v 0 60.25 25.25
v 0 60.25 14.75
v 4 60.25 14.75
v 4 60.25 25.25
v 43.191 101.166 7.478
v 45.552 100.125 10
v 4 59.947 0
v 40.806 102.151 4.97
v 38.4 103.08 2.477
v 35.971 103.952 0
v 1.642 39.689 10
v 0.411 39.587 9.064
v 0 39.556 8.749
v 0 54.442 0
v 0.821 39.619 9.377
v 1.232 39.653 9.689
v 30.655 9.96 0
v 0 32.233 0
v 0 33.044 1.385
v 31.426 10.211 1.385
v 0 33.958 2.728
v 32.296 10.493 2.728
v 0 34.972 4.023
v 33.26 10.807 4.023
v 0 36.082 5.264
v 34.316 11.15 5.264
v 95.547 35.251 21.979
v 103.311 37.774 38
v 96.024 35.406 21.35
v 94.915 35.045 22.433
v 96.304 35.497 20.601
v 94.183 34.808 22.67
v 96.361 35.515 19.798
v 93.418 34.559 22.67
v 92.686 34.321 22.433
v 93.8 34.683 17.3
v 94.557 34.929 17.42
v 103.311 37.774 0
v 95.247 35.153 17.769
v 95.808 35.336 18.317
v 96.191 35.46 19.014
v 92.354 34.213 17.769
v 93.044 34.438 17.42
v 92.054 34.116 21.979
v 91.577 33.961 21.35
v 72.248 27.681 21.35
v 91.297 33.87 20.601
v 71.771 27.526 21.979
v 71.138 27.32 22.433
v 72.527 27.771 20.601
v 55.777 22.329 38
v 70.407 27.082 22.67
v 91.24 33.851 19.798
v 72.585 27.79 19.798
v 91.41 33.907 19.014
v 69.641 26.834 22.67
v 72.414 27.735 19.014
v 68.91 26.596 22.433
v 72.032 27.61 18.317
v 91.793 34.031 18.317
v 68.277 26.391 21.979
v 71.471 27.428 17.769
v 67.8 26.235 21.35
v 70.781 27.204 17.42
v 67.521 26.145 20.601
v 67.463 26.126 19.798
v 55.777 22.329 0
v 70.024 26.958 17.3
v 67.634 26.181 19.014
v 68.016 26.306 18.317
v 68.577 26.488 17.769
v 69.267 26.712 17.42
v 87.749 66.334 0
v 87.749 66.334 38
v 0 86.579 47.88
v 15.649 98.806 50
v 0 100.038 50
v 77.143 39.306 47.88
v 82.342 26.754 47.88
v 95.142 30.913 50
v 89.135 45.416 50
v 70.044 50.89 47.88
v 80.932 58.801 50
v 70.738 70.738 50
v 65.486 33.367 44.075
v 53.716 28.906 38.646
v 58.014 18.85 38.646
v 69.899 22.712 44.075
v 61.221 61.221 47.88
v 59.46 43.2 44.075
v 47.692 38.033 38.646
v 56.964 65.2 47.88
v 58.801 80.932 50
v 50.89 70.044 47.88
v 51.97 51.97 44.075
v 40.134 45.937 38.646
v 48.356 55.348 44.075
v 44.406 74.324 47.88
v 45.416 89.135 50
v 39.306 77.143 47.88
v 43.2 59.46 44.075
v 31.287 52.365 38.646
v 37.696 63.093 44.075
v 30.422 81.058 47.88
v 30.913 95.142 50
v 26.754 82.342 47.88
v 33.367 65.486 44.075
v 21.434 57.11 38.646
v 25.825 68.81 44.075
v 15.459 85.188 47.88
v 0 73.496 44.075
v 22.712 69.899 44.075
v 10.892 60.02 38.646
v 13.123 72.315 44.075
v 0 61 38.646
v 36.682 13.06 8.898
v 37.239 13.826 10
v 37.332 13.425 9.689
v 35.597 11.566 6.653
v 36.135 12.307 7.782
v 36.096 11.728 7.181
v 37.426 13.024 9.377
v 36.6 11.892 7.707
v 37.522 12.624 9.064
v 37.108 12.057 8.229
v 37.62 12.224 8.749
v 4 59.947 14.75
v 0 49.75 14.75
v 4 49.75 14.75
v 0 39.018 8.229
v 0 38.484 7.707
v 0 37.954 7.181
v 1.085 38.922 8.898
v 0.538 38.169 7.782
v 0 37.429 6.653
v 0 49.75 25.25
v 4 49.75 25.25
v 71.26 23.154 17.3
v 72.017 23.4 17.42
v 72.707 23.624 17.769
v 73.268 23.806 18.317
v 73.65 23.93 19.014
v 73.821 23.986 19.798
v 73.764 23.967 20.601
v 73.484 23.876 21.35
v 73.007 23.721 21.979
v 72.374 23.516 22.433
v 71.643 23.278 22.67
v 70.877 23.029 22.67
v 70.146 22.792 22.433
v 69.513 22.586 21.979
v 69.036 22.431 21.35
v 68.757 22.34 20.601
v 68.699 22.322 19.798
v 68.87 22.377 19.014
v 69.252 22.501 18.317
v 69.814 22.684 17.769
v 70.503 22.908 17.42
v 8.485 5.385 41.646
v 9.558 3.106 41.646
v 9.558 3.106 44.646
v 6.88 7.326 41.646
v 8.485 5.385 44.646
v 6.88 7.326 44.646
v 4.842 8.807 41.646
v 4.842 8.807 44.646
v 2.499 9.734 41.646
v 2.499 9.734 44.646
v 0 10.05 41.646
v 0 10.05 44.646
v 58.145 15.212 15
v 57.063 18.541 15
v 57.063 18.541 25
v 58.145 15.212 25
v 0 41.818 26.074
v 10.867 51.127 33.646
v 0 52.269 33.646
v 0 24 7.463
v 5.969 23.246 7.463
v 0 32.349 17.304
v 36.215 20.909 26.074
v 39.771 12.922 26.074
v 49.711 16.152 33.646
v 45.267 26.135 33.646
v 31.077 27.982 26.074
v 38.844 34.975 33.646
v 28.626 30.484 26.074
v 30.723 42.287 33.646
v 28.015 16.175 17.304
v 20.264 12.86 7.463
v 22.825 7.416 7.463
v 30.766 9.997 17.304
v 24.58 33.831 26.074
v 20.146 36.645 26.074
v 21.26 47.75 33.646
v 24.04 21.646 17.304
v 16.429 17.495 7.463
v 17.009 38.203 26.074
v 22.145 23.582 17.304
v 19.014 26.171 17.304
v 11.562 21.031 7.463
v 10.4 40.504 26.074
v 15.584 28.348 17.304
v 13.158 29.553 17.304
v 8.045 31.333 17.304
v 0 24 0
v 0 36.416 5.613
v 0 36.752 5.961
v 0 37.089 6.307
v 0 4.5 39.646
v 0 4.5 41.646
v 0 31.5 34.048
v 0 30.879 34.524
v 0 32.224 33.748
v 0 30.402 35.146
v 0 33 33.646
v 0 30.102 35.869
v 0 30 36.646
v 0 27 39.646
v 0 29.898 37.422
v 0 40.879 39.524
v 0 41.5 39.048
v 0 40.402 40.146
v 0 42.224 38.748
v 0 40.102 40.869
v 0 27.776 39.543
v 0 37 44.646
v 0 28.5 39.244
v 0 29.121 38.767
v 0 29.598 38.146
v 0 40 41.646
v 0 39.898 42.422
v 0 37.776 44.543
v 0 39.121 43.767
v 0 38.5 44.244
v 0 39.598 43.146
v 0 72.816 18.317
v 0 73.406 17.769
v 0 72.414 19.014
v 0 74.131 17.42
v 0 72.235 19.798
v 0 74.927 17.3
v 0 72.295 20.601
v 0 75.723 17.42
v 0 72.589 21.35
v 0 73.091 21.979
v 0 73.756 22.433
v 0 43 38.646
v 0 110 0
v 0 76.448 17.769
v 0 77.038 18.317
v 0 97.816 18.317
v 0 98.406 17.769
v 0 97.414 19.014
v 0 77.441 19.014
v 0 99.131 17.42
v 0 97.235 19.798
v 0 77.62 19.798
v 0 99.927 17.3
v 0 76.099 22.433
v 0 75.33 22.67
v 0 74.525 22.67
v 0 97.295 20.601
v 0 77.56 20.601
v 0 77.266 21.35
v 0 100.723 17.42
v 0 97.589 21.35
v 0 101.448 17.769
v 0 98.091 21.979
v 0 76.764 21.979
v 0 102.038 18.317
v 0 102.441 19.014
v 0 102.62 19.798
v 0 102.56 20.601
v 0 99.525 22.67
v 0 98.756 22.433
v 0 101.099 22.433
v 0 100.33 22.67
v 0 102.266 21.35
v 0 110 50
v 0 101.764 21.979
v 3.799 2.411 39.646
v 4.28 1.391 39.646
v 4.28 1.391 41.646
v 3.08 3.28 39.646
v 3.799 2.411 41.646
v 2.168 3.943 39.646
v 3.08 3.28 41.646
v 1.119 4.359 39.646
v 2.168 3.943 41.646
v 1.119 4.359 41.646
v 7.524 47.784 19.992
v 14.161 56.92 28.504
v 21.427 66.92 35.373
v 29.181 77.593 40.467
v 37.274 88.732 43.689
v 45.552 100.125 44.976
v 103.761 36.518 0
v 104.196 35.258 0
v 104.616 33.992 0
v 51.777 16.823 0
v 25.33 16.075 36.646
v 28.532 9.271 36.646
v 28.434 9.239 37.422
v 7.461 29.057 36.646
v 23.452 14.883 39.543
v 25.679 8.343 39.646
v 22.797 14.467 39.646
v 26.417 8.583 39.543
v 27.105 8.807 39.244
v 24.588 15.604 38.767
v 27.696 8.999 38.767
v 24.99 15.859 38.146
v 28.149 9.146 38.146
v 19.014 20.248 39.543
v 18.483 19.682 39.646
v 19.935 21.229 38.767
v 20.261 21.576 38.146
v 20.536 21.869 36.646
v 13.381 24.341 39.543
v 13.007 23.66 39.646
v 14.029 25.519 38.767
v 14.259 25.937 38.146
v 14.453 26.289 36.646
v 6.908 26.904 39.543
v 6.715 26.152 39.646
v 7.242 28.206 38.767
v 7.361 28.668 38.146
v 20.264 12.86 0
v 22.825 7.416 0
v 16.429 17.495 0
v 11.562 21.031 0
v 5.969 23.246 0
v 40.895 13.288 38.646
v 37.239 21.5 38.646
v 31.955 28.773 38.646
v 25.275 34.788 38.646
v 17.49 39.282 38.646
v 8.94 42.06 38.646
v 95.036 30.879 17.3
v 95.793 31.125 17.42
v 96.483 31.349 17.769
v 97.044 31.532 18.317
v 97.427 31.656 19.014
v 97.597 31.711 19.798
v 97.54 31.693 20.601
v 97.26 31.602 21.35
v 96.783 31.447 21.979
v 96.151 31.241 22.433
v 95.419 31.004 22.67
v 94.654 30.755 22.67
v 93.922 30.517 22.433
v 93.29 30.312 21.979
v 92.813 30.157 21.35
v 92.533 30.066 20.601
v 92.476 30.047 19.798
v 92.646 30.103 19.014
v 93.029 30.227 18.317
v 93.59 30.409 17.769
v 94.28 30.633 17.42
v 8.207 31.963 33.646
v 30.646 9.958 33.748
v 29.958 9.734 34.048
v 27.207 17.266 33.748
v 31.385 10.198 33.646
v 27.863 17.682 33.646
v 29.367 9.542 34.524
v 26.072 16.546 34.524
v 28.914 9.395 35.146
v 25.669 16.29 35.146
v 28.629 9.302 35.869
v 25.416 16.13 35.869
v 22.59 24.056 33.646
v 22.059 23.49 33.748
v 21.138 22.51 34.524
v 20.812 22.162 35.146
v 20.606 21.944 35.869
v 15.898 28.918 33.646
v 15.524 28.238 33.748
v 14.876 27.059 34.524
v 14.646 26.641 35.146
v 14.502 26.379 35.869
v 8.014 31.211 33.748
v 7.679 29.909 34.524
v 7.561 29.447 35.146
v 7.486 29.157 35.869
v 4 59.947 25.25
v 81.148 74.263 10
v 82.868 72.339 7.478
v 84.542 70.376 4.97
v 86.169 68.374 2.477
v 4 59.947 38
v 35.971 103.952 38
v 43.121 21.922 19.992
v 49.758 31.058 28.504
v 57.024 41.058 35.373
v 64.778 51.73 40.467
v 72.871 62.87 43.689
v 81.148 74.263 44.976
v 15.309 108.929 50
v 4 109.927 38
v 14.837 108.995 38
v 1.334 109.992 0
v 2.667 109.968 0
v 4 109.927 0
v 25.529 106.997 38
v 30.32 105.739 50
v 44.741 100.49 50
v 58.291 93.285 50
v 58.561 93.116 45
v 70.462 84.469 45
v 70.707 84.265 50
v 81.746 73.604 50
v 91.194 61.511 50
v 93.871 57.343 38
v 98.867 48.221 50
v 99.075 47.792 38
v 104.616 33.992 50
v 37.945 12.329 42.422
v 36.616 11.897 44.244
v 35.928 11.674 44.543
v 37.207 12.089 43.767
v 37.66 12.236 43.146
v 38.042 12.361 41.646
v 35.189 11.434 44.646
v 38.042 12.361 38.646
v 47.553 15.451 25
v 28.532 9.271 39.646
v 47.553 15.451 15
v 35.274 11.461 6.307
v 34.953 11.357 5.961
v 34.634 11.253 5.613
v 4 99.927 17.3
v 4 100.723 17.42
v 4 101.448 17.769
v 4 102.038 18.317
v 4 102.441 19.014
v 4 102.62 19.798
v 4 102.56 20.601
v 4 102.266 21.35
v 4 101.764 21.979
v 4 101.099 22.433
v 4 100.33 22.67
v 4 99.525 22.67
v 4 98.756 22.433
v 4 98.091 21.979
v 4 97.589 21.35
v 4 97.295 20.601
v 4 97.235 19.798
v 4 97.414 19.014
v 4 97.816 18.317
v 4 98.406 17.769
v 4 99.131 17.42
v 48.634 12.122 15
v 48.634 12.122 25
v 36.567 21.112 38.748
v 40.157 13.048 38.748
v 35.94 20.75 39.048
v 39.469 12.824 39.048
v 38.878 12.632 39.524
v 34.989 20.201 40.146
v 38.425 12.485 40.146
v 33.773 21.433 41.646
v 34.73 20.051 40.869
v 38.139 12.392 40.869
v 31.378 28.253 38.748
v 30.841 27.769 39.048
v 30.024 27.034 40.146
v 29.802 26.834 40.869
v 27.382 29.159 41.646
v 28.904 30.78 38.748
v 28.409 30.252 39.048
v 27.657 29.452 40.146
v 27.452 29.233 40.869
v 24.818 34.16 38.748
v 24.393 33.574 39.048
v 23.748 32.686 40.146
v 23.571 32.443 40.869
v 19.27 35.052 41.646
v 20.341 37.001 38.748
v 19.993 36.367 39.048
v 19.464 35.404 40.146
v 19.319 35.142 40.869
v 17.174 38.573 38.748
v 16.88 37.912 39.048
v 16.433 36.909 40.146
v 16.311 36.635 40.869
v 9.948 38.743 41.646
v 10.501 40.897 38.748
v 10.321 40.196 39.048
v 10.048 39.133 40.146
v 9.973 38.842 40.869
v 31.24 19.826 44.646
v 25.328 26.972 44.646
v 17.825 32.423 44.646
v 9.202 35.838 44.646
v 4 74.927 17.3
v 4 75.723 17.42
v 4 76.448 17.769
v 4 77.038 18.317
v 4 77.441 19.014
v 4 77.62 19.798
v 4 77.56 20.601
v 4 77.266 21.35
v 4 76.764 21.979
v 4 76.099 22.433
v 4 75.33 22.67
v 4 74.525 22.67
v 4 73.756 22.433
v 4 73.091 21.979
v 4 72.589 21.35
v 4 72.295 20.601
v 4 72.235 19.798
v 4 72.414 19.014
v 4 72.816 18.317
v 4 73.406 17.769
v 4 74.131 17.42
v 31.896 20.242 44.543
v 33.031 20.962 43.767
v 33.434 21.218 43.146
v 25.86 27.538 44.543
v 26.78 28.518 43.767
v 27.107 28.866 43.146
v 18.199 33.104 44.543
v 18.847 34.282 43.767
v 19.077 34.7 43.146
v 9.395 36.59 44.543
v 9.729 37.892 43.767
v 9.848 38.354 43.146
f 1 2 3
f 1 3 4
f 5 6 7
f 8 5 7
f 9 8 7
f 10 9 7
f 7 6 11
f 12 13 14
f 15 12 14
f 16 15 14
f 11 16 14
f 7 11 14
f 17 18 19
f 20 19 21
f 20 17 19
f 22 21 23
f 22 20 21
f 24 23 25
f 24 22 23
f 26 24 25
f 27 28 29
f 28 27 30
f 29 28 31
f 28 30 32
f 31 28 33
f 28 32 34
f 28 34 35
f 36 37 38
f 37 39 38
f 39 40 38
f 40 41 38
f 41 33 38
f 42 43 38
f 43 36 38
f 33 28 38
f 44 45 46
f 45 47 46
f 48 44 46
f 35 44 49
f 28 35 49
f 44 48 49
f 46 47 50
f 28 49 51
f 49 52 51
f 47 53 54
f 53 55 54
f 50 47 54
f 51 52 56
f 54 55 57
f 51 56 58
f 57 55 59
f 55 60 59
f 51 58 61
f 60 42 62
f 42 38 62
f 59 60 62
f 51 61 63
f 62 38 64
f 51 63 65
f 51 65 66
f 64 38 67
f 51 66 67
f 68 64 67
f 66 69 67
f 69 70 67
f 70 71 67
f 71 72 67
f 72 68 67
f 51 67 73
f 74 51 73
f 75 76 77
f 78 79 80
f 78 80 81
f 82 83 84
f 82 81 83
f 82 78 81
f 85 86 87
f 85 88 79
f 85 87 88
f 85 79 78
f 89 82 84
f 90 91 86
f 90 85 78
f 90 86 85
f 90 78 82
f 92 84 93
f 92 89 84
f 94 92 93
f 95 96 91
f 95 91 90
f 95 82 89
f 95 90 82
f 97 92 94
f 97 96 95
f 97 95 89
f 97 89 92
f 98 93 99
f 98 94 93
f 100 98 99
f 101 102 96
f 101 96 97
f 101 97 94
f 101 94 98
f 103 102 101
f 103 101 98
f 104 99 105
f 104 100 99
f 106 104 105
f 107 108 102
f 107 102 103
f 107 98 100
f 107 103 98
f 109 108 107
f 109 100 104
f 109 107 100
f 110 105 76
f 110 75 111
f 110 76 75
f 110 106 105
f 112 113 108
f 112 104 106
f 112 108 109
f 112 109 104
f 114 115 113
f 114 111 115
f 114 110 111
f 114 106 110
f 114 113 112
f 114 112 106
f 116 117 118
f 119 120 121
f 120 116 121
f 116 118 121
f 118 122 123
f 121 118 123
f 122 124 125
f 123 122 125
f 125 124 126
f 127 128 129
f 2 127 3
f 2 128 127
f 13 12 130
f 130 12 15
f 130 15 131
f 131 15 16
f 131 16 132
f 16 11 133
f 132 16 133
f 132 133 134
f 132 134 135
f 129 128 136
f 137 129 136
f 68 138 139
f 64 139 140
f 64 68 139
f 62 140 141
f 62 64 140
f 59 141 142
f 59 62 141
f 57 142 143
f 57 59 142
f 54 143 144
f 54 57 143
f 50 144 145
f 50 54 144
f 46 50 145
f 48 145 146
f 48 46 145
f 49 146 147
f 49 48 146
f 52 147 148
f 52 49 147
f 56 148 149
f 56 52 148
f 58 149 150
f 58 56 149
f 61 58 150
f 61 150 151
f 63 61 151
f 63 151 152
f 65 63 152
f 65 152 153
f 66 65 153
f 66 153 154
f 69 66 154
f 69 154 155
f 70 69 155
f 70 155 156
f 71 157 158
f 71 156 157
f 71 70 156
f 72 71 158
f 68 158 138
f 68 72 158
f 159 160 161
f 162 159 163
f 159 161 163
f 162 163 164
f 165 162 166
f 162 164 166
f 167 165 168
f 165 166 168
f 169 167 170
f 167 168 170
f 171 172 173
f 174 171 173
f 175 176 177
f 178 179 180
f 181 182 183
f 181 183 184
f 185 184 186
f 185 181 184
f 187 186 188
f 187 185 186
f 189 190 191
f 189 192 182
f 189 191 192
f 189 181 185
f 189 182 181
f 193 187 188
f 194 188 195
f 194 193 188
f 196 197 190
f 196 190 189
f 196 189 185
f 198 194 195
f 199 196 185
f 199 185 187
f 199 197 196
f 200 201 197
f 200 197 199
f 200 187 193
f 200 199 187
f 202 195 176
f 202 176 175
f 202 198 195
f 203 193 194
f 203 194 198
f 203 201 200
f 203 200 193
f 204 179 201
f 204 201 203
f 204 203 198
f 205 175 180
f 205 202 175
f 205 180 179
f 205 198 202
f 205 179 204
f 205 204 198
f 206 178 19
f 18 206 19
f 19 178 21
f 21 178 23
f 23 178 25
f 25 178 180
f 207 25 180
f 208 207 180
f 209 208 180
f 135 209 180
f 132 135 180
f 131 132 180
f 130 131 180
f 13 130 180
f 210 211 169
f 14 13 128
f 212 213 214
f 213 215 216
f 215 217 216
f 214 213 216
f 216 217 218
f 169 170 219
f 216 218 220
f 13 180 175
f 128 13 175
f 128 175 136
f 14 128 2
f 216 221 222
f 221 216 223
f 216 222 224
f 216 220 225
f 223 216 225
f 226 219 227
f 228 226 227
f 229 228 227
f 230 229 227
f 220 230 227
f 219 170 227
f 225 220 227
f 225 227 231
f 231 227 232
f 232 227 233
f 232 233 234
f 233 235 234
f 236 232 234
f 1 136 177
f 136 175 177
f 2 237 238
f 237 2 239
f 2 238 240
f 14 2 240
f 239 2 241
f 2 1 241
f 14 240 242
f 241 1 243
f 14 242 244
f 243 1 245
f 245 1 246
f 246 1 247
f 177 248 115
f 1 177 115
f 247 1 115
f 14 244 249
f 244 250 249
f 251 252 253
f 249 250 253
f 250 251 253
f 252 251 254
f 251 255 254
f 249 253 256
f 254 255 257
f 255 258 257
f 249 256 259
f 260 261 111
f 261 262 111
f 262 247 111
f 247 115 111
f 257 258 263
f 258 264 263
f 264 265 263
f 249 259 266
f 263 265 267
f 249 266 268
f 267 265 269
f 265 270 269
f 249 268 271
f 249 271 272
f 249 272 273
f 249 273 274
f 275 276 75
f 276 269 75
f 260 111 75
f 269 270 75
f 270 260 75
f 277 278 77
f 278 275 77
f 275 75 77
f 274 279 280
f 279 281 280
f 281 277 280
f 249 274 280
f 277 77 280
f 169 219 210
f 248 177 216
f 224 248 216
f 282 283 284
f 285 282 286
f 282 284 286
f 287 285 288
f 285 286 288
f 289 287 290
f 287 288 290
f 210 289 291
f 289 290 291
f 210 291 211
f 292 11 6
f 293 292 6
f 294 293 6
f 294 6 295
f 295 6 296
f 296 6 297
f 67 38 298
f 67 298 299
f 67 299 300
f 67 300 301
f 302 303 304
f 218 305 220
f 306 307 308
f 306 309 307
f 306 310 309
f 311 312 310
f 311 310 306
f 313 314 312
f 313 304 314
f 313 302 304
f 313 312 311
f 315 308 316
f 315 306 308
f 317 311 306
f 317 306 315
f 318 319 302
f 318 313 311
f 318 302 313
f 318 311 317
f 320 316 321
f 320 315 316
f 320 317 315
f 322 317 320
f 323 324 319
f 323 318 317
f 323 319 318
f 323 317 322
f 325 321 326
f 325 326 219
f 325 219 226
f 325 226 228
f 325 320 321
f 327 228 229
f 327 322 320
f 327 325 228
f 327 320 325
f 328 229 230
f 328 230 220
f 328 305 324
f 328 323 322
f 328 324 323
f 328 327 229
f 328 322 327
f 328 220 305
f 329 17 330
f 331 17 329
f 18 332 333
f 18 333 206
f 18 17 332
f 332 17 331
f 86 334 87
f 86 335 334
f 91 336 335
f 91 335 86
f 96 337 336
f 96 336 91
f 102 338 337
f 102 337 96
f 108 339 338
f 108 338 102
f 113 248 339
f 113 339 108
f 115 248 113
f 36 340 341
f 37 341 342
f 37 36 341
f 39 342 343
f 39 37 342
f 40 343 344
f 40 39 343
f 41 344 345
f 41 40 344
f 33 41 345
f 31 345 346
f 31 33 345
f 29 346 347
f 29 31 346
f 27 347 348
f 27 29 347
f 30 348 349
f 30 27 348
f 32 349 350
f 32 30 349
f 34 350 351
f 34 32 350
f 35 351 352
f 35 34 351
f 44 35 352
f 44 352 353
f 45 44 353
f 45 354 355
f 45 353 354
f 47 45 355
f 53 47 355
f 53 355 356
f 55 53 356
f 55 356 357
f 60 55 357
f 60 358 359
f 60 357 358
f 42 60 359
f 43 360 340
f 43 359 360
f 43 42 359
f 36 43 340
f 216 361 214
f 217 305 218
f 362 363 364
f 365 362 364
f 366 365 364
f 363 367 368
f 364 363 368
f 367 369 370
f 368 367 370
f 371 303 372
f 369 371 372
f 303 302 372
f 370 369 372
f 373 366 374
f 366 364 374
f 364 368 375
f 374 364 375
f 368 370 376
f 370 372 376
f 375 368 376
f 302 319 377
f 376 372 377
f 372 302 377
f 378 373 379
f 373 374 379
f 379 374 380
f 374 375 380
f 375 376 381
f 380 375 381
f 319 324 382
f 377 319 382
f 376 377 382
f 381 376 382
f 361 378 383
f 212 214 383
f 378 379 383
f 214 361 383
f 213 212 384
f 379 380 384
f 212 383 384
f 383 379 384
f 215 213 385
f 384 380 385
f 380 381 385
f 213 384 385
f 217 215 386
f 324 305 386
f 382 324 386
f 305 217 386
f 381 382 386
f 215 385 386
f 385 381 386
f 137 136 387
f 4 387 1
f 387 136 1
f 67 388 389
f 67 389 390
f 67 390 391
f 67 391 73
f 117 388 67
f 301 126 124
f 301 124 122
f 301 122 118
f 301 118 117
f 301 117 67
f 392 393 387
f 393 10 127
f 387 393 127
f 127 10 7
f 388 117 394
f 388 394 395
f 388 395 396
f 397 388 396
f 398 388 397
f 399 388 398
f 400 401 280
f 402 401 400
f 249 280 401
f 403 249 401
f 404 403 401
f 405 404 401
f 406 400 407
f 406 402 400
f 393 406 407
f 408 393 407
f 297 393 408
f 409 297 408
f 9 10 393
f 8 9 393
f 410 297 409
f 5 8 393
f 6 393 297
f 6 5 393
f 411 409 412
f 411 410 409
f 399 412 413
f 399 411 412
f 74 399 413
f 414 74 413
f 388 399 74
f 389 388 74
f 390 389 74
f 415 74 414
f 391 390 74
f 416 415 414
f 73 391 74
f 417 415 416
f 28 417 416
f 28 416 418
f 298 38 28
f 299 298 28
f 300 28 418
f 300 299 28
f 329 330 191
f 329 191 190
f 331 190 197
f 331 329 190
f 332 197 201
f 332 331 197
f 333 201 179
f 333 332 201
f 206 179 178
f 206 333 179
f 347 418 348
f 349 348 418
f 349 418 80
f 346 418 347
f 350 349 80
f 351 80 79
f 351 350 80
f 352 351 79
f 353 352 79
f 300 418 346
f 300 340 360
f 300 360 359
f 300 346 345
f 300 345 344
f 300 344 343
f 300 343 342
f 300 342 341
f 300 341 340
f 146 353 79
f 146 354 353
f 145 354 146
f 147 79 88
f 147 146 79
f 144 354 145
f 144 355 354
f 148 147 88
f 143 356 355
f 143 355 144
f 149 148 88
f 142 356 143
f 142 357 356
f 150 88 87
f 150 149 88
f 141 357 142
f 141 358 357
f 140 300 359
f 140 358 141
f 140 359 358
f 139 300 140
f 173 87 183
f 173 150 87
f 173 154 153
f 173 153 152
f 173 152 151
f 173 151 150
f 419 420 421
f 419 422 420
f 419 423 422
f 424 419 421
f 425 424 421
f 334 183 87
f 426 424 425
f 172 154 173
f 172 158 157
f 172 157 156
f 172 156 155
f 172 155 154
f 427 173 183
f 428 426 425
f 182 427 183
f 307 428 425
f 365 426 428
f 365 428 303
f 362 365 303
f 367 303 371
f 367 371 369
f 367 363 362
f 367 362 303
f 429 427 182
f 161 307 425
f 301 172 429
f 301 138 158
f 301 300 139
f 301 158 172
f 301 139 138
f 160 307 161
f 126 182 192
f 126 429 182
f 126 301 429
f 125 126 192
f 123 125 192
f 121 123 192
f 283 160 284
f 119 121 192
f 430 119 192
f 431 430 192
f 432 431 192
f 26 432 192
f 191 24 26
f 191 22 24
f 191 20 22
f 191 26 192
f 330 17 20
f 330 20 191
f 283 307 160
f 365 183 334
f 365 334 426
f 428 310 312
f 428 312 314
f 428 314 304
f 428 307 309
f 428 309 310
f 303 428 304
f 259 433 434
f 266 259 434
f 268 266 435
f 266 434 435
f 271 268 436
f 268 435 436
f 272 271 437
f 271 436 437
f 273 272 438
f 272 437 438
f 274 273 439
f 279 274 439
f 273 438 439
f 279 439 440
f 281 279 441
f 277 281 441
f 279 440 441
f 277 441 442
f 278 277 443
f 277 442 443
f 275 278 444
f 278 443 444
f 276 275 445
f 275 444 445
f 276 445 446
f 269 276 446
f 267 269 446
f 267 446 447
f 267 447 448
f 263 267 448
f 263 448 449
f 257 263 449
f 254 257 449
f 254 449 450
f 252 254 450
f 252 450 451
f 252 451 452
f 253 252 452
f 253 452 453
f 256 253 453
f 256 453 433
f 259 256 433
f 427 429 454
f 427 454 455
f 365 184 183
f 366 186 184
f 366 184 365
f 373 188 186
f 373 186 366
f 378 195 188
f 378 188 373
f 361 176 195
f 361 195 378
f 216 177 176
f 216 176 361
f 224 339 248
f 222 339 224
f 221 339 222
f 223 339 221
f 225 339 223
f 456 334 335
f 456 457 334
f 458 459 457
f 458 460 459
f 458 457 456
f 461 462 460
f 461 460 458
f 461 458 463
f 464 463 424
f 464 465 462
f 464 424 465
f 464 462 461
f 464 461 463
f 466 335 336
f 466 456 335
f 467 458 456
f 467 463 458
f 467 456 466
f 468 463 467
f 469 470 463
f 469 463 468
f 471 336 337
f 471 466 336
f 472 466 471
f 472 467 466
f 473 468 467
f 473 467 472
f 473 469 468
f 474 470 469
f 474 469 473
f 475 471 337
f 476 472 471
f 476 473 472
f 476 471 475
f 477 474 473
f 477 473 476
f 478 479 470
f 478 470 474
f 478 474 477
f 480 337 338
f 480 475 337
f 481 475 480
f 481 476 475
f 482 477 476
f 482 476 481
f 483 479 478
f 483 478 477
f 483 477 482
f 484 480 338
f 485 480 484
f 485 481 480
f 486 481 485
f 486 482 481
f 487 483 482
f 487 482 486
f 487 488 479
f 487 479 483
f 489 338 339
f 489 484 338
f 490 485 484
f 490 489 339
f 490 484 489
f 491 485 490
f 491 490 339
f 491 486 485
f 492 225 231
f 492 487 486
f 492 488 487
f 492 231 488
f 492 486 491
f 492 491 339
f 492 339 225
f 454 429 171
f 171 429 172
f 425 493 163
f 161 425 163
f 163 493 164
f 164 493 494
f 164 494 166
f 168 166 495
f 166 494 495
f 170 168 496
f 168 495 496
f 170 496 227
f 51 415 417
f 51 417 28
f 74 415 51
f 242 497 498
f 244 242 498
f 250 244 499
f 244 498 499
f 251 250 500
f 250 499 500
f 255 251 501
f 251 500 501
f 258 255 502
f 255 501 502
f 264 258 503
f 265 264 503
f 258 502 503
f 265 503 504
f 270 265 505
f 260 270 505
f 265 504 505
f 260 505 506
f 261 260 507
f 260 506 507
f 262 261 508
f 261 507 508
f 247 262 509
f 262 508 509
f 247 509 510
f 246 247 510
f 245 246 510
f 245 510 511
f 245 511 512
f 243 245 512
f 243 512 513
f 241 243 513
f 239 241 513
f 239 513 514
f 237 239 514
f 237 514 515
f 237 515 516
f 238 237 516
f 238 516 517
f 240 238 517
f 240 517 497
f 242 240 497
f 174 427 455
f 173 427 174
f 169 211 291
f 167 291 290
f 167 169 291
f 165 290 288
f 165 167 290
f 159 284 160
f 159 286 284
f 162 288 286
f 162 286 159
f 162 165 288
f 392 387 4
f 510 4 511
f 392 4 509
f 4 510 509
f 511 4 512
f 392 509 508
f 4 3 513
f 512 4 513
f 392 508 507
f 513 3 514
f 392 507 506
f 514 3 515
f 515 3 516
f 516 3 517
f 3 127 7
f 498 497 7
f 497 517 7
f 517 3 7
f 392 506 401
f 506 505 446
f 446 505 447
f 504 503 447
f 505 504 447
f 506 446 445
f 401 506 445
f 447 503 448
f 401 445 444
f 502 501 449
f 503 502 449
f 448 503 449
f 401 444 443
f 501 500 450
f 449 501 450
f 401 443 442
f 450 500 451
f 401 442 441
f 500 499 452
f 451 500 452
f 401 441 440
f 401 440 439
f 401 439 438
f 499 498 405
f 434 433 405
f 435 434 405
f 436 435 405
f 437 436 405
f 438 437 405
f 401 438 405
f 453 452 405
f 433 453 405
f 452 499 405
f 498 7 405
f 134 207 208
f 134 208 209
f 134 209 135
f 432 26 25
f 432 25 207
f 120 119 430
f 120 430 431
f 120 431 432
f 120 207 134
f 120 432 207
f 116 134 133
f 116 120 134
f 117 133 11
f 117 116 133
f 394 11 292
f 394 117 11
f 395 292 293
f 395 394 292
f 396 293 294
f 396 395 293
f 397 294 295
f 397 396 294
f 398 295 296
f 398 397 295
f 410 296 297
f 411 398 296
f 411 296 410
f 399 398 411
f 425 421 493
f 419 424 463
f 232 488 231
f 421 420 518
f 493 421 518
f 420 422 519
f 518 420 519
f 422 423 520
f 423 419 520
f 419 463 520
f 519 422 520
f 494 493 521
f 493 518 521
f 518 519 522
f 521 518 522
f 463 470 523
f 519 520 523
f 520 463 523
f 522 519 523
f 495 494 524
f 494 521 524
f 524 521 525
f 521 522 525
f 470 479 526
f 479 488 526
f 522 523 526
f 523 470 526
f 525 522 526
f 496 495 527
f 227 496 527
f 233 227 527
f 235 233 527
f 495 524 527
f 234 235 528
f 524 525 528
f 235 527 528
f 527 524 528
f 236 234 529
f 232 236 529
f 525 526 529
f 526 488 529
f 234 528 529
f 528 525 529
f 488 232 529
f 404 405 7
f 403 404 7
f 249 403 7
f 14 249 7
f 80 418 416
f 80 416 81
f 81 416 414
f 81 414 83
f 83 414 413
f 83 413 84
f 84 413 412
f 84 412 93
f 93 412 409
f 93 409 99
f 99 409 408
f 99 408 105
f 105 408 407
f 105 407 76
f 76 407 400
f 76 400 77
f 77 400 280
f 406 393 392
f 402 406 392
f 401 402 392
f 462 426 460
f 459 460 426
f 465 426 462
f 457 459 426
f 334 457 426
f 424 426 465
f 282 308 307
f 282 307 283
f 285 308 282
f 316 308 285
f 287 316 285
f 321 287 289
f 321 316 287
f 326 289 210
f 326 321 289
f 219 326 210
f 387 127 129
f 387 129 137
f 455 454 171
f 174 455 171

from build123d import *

# Parameters (mm, degrees)
EXTRUDE_1_DEPTH          = 50
CUT_EXTRUDE_1_DEPTH      = 22
CUT_EXTRUDE_1_DEPTH_BACK = 22
CHAMFER_1_SIZE           = 10
CUT_EXTRUDE_4_DEPTH      = 38
SKETCH_7_R               = 2.7
CUT_EXTRUDE_5_DEPTH      = 158.237473694
SKETCH_12_W              = 10.5
SKETCH_12_H              = 10.5
CUT_EXTRUDE_8_DEPTH      = 4
SKETCH_13_W              = 10
SKETCH_13_H              = 10
EXTRUDE_3_DEPTH          = 3.5
EXTRUDE_4_DEPTH          = 6
SKETCH_16_R              = 10.05
CUT_EXTRUDE_11_DEPTH     = 3
SKETCH_17_R              = 4.5
CUT_EXTRUDE_12_DEPTH     = 158.41319251
SKETCH_18_R              = 30
CUT_EXTRUDE_13_DEPTH     = 6
FILLET_1_2_ANGLE         = 72
FILLET_1_3_ANGLE         = 72
FILLET_1_4_ANGLE         = 72


with BuildPart() as part:
    # 草图1 → 凸台-拉伸1 (new body)
    with BuildSketch(Plane.XY):
        with BuildLine():
            Line((0, 0), (0, 110))
            ThreePointArc((0, 110), (64.656377752, 88.991869381), (104.616216792, 33.991869381))
            Line((104.616216792, 33.991869381), (0, 0))
        make_face()
    extrude(amount=EXTRUDE_1_DEPTH)

    # 草图2 → 切除-拉伸1 (cut, two sides: drawn at the far end of the back side and taken through both)
    with BuildSketch(Plane(origin=(0, 0, 0), x_dir=(0, 0, 1), z_dir=(-0.8090169943749467, 0.5877852522924744, 0)).offset(-CUT_EXTRUDE_1_DEPTH_BACK)):
        with BuildLine():
            Line((-2.434479972, 121.031505263), (-32.434479972, 60.021300119))
            ThreePointArc((-32.434479972, 60.021300119), (-25.826576487, 29.63728916), (5.26447133, 29.190908144))
            ThreePointArc((5.26447133, 29.190908144), (34.528838333, 64.97494707), (45, 110))
            ThreePointArc((45, 110), (25.662949792, 134.35017453), (-2.434479972, 121.031505263))
        make_face()
    extrude(amount=CUT_EXTRUDE_1_DEPTH + CUT_EXTRUDE_1_DEPTH_BACK, mode=Mode.SUBTRACT)

    # 倒角1
    # the kernel refuses this chamfer: 10 mm, written as the material it takes off along each edge
    with BuildSketch(Plane(origin=(-15.115973339, 16.623283153, 0), x_dir=(0, 0, 1), z_dir=(0.5877852522924744, 0.8090169943749467, 0))) as chamfer_1_piece_1_section:
        Polygon((CHAMFER_1_SIZE, 0), (0, -CHAMFER_1_SIZE), (0, 0), align=None)
    chamfer_1_piece_1 = extrude(amount=128.930806191, mode=Mode.PRIVATE)
    chamfer_1_piece_1 = chamfer_1_piece_1 & Plane(origin=(46.858003876, 101.923144932, -57.037418863), x_dir=(-0.4654997448337989, -0.6407054327731835, 0.6105788531996469), z_dir=(0.8090169943749466, -0.5877852522924744, 0)) * Cylinder(102.037418863, 298, mode=Mode.PRIVATE)
    add(chamfer_1_piece_1, mode=Mode.SUBTRACT)
    with BuildSketch(Plane(origin=(20.480774414, -9.239267947, 0), x_dir=(0, 0, 1), z_dir=(0.5877852522924744, 0.8090169943749467, 0))) as chamfer_1_piece_2_section:
        Polygon((CHAMFER_1_SIZE, 0), (0, CHAMFER_1_SIZE), (0, 0), align=None)
    chamfer_1_piece_2 = extrude(amount=128.930806191, mode=Mode.PRIVATE)
    chamfer_1_piece_2 = chamfer_1_piece_2 & Plane(origin=(82.454751628, 76.060593831, -57.037418863), x_dir=(-0.4654997448337989, -0.6407054327731835, 0.6105788531996469), z_dir=(0.8090169943749466, -0.5877852522924744, 0)) * Cylinder(102.037418863, 298, mode=Mode.PRIVATE)
    add(chamfer_1_piece_2, mode=Mode.SUBTRACT)

    # 草图5 → 切除-旋转2 (revolve, cut)
    with BuildSketch(Plane(origin=(0, 0, 0), x_dir=(0, 0, 1), z_dir=(-0.8090169943749467, 0.5877852522924744, 0))):
        with BuildLine():
            Line((38.64565174, 61), (38.64565174, 0))
            Line((38.64565174, 0), (50.462581137, 0))
            Line((50.462581137, 0), (50.462581137, 110))
            ThreePointArc((50.462581137, 110), (47.466600414, 84.797620051), (38.64565174, 61))
        make_face()
        with BuildLine():
            Line((-5, 24), (-5, 0))
            Line((-5, 0), (33.64565174, 0))
            Line((33.64565174, 0), (33.64565174, 52.269326125))
            ThreePointArc((33.64565174, 52.269326125), (21.831047905, 36.951968201), (7.462581137, 24))
            Line((7.462581137, 24), (-5, 24))
        make_face()
    revolve(axis=Axis((0, 0, -7.898129057), (0, 0, 1)), mode=Mode.SUBTRACT)

    # 草图6 → 切除-拉伸4 (cut)
    with BuildSketch(Plane(origin=(0, 0, 0), x_dir=(-1, 0, 0), z_dir=(0, 0, -1))):
        Polygon((-4, 59.947179416), (-4, 121.087474703), (-38.681182805, 107.68173241), align=None)
        Polygon((-90.458270445, 70.063476264), (-113.924963881, 41.222313554), (-55.77708764, 22.32892327), align=None)
    extrude(amount=-CUT_EXTRUDE_4_DEPTH, mode=Mode.SUBTRACT)

    # 草图7 → 切除-拉伸5 (cut, through all)
    with BuildSketch(Plane(origin=(4, 0, 0), x_dir=(0, 0, -1), z_dir=(1, 0, 0))):
        with Locations((-20, 99.927248669)):
            Circle(SKETCH_7_R)
        with Locations((-20, 74.927248669)):
            Circle(SKETCH_7_R)
    cut_extrude_5 = extrude(amount=-CUT_EXTRUDE_5_DEPTH, mode=Mode.SUBTRACT)

    # 镜向1: 切除-拉伸5 across plane
    add(cut_extrude_5.mirror(Plane(origin=(0, 0, 0), x_dir=(0, 0, 1), z_dir=(-0.8090169943749466, 0.5877852522924742, 0))), mode=Mode.SUBTRACT)

    # 草图12 → 切除-拉伸8 (cut)
    with BuildSketch(Plane.ZY):
        with Locations((20, 55)):
            Rectangle(SKETCH_12_W, SKETCH_12_H)
    extrude(amount=-CUT_EXTRUDE_8_DEPTH, mode=Mode.SUBTRACT)

    # 草图13 → 凸台-拉伸3 (add)
    with BuildSketch(Plane(origin=(0, 0, 0), x_dir=(0.9510565162951544, 0.30901699437494484, 0), z_dir=(0.30901699437494484, -0.9510565162951544, 0))):
        with Locations((55, 20)):
            Rectangle(SKETCH_13_W, SKETCH_13_H)
    extrude(amount=EXTRUDE_3_DEPTH)

    # 草图14 → 凸台-拉伸4 (add)
    with BuildSketch(Plane.XY.offset(38.64565174)):
        with BuildLine():
            Line((0, 0), (0, 40))
            ThreePointArc((0, 40), (23.511410092, 32.360679775), (38.042260652, 12.360679775))
            Line((38.042260652, 12.360679775), (0, 0))
        make_face()
    extrude(amount=EXTRUDE_4_DEPTH)

    # 草图16 → 切除-拉伸11 (cut)
    with BuildSketch(Plane.XY.offset(44.64565174)):
        Circle(SKETCH_16_R)
    extrude(amount=-CUT_EXTRUDE_11_DEPTH, mode=Mode.SUBTRACT)

    # 草图17 → 切除-拉伸12 (cut, through all)
    with BuildSketch(Plane.XY.offset(41.64565174)):
        Circle(SKETCH_17_R)
    extrude(amount=-CUT_EXTRUDE_12_DEPTH, mode=Mode.SUBTRACT)

    # 草图18 → 切除-拉伸13 (cut)
    with BuildSketch(Plane(origin=(0, 0, 33.64565174), x_dir=(-1, 0, 0), z_dir=(0, 0, -1))):
        Circle(SKETCH_18_R)
    extrude(amount=-CUT_EXTRUDE_13_DEPTH, mode=Mode.SUBTRACT)

    # 圆角1: read off the stored shape, not the designer's step
    # 圆角1 outline → 圆角1 (revolve, cut)
    with BuildSketch(Plane.XZ):
        with BuildLine():
            ThreePointArc((30, 36.64565174), (29.802517077, 37.716118009), (29.236067978, 38.64565174))
            Line((29.236067978, 38.64565174), (27, 38.64565174))
            Line((27, 38.64565174), (27, 33.64565174))
            Line((27, 33.64565174), (33, 33.64565174))
            ThreePointArc((33, 33.64565174), (30.878679657, 34.524331396), (30, 36.64565174))
        make_face()
    revolve(axis=Axis((0, 0, 0), (0, 0, 1)), mode=Mode.SUBTRACT)

    # Fillet 1 2 outline → Fillet 1 2 (revolve)
    with BuildSketch(Plane(origin=(0, 0, 0), x_dir=(0.9510565162951545, 0.30901699437494434, 0), z_dir=(0.30901699437494434, -0.9510565162951545, 0))):
        with BuildLine():
            Line((30, 39.64565174), (27, 39.64565174))
            ThreePointArc((27, 39.64565174), (29.121320344, 38.766972084), (30, 36.64565174))
            Line((30, 36.64565174), (30, 39.64565174))
        make_face()
    revolve(axis=Axis((0, 0, 0), (0, 0, 1)), revolution_arc=FILLET_1_2_ANGLE)

    # Fillet 1 3 outline → Fillet 1 3 (revolve)
    with BuildSketch(Plane(origin=(0, 0, 0), x_dir=(0.9510565162951548, 0.30901699437494395, 0), z_dir=(0.30901699437494395, -0.9510565162951548, 0))):
        with BuildLine():
            ThreePointArc((43, 38.64565174), (40.878679657, 39.524331397), (40, 41.64565174))
            ThreePointArc((40, 41.64565174), (39.121320344, 43.766972084), (37, 44.64565174))
            Line((37, 44.64565174), (37, 38.64565174))
            Line((37, 38.64565174), (43, 38.64565174))
        make_face()
    revolve(axis=Axis((0, 0, 0), (0, 0, 1)), revolution_arc=FILLET_1_3_ANGLE)

    # Fillet 1 4 outline → Fillet 1 4 (revolve, cut)
    with BuildSketch(Plane(origin=(0, 0, 0), x_dir=(0.9510565162951548, 0.30901699437494395, 0), z_dir=(0.30901699437494395, -0.9510565162951548, 0))):
        with BuildLine():
            ThreePointArc((37, 44.64565174), (39.121320344, 43.766972084), (40, 41.64565174))
            ThreePointArc((40, 41.64565174), (40.878679657, 39.524331397), (43, 38.64565174))
            Line((43, 38.64565174), (43, 44.64565174))
            Line((43, 44.64565174), (37, 44.64565174))
        make_face()
    revolve(axis=Axis((0, 0, 0), (0, 0, 1)), revolution_arc=FILLET_1_4_ANGLE, mode=Mode.SUBTRACT)


solid = part.part
